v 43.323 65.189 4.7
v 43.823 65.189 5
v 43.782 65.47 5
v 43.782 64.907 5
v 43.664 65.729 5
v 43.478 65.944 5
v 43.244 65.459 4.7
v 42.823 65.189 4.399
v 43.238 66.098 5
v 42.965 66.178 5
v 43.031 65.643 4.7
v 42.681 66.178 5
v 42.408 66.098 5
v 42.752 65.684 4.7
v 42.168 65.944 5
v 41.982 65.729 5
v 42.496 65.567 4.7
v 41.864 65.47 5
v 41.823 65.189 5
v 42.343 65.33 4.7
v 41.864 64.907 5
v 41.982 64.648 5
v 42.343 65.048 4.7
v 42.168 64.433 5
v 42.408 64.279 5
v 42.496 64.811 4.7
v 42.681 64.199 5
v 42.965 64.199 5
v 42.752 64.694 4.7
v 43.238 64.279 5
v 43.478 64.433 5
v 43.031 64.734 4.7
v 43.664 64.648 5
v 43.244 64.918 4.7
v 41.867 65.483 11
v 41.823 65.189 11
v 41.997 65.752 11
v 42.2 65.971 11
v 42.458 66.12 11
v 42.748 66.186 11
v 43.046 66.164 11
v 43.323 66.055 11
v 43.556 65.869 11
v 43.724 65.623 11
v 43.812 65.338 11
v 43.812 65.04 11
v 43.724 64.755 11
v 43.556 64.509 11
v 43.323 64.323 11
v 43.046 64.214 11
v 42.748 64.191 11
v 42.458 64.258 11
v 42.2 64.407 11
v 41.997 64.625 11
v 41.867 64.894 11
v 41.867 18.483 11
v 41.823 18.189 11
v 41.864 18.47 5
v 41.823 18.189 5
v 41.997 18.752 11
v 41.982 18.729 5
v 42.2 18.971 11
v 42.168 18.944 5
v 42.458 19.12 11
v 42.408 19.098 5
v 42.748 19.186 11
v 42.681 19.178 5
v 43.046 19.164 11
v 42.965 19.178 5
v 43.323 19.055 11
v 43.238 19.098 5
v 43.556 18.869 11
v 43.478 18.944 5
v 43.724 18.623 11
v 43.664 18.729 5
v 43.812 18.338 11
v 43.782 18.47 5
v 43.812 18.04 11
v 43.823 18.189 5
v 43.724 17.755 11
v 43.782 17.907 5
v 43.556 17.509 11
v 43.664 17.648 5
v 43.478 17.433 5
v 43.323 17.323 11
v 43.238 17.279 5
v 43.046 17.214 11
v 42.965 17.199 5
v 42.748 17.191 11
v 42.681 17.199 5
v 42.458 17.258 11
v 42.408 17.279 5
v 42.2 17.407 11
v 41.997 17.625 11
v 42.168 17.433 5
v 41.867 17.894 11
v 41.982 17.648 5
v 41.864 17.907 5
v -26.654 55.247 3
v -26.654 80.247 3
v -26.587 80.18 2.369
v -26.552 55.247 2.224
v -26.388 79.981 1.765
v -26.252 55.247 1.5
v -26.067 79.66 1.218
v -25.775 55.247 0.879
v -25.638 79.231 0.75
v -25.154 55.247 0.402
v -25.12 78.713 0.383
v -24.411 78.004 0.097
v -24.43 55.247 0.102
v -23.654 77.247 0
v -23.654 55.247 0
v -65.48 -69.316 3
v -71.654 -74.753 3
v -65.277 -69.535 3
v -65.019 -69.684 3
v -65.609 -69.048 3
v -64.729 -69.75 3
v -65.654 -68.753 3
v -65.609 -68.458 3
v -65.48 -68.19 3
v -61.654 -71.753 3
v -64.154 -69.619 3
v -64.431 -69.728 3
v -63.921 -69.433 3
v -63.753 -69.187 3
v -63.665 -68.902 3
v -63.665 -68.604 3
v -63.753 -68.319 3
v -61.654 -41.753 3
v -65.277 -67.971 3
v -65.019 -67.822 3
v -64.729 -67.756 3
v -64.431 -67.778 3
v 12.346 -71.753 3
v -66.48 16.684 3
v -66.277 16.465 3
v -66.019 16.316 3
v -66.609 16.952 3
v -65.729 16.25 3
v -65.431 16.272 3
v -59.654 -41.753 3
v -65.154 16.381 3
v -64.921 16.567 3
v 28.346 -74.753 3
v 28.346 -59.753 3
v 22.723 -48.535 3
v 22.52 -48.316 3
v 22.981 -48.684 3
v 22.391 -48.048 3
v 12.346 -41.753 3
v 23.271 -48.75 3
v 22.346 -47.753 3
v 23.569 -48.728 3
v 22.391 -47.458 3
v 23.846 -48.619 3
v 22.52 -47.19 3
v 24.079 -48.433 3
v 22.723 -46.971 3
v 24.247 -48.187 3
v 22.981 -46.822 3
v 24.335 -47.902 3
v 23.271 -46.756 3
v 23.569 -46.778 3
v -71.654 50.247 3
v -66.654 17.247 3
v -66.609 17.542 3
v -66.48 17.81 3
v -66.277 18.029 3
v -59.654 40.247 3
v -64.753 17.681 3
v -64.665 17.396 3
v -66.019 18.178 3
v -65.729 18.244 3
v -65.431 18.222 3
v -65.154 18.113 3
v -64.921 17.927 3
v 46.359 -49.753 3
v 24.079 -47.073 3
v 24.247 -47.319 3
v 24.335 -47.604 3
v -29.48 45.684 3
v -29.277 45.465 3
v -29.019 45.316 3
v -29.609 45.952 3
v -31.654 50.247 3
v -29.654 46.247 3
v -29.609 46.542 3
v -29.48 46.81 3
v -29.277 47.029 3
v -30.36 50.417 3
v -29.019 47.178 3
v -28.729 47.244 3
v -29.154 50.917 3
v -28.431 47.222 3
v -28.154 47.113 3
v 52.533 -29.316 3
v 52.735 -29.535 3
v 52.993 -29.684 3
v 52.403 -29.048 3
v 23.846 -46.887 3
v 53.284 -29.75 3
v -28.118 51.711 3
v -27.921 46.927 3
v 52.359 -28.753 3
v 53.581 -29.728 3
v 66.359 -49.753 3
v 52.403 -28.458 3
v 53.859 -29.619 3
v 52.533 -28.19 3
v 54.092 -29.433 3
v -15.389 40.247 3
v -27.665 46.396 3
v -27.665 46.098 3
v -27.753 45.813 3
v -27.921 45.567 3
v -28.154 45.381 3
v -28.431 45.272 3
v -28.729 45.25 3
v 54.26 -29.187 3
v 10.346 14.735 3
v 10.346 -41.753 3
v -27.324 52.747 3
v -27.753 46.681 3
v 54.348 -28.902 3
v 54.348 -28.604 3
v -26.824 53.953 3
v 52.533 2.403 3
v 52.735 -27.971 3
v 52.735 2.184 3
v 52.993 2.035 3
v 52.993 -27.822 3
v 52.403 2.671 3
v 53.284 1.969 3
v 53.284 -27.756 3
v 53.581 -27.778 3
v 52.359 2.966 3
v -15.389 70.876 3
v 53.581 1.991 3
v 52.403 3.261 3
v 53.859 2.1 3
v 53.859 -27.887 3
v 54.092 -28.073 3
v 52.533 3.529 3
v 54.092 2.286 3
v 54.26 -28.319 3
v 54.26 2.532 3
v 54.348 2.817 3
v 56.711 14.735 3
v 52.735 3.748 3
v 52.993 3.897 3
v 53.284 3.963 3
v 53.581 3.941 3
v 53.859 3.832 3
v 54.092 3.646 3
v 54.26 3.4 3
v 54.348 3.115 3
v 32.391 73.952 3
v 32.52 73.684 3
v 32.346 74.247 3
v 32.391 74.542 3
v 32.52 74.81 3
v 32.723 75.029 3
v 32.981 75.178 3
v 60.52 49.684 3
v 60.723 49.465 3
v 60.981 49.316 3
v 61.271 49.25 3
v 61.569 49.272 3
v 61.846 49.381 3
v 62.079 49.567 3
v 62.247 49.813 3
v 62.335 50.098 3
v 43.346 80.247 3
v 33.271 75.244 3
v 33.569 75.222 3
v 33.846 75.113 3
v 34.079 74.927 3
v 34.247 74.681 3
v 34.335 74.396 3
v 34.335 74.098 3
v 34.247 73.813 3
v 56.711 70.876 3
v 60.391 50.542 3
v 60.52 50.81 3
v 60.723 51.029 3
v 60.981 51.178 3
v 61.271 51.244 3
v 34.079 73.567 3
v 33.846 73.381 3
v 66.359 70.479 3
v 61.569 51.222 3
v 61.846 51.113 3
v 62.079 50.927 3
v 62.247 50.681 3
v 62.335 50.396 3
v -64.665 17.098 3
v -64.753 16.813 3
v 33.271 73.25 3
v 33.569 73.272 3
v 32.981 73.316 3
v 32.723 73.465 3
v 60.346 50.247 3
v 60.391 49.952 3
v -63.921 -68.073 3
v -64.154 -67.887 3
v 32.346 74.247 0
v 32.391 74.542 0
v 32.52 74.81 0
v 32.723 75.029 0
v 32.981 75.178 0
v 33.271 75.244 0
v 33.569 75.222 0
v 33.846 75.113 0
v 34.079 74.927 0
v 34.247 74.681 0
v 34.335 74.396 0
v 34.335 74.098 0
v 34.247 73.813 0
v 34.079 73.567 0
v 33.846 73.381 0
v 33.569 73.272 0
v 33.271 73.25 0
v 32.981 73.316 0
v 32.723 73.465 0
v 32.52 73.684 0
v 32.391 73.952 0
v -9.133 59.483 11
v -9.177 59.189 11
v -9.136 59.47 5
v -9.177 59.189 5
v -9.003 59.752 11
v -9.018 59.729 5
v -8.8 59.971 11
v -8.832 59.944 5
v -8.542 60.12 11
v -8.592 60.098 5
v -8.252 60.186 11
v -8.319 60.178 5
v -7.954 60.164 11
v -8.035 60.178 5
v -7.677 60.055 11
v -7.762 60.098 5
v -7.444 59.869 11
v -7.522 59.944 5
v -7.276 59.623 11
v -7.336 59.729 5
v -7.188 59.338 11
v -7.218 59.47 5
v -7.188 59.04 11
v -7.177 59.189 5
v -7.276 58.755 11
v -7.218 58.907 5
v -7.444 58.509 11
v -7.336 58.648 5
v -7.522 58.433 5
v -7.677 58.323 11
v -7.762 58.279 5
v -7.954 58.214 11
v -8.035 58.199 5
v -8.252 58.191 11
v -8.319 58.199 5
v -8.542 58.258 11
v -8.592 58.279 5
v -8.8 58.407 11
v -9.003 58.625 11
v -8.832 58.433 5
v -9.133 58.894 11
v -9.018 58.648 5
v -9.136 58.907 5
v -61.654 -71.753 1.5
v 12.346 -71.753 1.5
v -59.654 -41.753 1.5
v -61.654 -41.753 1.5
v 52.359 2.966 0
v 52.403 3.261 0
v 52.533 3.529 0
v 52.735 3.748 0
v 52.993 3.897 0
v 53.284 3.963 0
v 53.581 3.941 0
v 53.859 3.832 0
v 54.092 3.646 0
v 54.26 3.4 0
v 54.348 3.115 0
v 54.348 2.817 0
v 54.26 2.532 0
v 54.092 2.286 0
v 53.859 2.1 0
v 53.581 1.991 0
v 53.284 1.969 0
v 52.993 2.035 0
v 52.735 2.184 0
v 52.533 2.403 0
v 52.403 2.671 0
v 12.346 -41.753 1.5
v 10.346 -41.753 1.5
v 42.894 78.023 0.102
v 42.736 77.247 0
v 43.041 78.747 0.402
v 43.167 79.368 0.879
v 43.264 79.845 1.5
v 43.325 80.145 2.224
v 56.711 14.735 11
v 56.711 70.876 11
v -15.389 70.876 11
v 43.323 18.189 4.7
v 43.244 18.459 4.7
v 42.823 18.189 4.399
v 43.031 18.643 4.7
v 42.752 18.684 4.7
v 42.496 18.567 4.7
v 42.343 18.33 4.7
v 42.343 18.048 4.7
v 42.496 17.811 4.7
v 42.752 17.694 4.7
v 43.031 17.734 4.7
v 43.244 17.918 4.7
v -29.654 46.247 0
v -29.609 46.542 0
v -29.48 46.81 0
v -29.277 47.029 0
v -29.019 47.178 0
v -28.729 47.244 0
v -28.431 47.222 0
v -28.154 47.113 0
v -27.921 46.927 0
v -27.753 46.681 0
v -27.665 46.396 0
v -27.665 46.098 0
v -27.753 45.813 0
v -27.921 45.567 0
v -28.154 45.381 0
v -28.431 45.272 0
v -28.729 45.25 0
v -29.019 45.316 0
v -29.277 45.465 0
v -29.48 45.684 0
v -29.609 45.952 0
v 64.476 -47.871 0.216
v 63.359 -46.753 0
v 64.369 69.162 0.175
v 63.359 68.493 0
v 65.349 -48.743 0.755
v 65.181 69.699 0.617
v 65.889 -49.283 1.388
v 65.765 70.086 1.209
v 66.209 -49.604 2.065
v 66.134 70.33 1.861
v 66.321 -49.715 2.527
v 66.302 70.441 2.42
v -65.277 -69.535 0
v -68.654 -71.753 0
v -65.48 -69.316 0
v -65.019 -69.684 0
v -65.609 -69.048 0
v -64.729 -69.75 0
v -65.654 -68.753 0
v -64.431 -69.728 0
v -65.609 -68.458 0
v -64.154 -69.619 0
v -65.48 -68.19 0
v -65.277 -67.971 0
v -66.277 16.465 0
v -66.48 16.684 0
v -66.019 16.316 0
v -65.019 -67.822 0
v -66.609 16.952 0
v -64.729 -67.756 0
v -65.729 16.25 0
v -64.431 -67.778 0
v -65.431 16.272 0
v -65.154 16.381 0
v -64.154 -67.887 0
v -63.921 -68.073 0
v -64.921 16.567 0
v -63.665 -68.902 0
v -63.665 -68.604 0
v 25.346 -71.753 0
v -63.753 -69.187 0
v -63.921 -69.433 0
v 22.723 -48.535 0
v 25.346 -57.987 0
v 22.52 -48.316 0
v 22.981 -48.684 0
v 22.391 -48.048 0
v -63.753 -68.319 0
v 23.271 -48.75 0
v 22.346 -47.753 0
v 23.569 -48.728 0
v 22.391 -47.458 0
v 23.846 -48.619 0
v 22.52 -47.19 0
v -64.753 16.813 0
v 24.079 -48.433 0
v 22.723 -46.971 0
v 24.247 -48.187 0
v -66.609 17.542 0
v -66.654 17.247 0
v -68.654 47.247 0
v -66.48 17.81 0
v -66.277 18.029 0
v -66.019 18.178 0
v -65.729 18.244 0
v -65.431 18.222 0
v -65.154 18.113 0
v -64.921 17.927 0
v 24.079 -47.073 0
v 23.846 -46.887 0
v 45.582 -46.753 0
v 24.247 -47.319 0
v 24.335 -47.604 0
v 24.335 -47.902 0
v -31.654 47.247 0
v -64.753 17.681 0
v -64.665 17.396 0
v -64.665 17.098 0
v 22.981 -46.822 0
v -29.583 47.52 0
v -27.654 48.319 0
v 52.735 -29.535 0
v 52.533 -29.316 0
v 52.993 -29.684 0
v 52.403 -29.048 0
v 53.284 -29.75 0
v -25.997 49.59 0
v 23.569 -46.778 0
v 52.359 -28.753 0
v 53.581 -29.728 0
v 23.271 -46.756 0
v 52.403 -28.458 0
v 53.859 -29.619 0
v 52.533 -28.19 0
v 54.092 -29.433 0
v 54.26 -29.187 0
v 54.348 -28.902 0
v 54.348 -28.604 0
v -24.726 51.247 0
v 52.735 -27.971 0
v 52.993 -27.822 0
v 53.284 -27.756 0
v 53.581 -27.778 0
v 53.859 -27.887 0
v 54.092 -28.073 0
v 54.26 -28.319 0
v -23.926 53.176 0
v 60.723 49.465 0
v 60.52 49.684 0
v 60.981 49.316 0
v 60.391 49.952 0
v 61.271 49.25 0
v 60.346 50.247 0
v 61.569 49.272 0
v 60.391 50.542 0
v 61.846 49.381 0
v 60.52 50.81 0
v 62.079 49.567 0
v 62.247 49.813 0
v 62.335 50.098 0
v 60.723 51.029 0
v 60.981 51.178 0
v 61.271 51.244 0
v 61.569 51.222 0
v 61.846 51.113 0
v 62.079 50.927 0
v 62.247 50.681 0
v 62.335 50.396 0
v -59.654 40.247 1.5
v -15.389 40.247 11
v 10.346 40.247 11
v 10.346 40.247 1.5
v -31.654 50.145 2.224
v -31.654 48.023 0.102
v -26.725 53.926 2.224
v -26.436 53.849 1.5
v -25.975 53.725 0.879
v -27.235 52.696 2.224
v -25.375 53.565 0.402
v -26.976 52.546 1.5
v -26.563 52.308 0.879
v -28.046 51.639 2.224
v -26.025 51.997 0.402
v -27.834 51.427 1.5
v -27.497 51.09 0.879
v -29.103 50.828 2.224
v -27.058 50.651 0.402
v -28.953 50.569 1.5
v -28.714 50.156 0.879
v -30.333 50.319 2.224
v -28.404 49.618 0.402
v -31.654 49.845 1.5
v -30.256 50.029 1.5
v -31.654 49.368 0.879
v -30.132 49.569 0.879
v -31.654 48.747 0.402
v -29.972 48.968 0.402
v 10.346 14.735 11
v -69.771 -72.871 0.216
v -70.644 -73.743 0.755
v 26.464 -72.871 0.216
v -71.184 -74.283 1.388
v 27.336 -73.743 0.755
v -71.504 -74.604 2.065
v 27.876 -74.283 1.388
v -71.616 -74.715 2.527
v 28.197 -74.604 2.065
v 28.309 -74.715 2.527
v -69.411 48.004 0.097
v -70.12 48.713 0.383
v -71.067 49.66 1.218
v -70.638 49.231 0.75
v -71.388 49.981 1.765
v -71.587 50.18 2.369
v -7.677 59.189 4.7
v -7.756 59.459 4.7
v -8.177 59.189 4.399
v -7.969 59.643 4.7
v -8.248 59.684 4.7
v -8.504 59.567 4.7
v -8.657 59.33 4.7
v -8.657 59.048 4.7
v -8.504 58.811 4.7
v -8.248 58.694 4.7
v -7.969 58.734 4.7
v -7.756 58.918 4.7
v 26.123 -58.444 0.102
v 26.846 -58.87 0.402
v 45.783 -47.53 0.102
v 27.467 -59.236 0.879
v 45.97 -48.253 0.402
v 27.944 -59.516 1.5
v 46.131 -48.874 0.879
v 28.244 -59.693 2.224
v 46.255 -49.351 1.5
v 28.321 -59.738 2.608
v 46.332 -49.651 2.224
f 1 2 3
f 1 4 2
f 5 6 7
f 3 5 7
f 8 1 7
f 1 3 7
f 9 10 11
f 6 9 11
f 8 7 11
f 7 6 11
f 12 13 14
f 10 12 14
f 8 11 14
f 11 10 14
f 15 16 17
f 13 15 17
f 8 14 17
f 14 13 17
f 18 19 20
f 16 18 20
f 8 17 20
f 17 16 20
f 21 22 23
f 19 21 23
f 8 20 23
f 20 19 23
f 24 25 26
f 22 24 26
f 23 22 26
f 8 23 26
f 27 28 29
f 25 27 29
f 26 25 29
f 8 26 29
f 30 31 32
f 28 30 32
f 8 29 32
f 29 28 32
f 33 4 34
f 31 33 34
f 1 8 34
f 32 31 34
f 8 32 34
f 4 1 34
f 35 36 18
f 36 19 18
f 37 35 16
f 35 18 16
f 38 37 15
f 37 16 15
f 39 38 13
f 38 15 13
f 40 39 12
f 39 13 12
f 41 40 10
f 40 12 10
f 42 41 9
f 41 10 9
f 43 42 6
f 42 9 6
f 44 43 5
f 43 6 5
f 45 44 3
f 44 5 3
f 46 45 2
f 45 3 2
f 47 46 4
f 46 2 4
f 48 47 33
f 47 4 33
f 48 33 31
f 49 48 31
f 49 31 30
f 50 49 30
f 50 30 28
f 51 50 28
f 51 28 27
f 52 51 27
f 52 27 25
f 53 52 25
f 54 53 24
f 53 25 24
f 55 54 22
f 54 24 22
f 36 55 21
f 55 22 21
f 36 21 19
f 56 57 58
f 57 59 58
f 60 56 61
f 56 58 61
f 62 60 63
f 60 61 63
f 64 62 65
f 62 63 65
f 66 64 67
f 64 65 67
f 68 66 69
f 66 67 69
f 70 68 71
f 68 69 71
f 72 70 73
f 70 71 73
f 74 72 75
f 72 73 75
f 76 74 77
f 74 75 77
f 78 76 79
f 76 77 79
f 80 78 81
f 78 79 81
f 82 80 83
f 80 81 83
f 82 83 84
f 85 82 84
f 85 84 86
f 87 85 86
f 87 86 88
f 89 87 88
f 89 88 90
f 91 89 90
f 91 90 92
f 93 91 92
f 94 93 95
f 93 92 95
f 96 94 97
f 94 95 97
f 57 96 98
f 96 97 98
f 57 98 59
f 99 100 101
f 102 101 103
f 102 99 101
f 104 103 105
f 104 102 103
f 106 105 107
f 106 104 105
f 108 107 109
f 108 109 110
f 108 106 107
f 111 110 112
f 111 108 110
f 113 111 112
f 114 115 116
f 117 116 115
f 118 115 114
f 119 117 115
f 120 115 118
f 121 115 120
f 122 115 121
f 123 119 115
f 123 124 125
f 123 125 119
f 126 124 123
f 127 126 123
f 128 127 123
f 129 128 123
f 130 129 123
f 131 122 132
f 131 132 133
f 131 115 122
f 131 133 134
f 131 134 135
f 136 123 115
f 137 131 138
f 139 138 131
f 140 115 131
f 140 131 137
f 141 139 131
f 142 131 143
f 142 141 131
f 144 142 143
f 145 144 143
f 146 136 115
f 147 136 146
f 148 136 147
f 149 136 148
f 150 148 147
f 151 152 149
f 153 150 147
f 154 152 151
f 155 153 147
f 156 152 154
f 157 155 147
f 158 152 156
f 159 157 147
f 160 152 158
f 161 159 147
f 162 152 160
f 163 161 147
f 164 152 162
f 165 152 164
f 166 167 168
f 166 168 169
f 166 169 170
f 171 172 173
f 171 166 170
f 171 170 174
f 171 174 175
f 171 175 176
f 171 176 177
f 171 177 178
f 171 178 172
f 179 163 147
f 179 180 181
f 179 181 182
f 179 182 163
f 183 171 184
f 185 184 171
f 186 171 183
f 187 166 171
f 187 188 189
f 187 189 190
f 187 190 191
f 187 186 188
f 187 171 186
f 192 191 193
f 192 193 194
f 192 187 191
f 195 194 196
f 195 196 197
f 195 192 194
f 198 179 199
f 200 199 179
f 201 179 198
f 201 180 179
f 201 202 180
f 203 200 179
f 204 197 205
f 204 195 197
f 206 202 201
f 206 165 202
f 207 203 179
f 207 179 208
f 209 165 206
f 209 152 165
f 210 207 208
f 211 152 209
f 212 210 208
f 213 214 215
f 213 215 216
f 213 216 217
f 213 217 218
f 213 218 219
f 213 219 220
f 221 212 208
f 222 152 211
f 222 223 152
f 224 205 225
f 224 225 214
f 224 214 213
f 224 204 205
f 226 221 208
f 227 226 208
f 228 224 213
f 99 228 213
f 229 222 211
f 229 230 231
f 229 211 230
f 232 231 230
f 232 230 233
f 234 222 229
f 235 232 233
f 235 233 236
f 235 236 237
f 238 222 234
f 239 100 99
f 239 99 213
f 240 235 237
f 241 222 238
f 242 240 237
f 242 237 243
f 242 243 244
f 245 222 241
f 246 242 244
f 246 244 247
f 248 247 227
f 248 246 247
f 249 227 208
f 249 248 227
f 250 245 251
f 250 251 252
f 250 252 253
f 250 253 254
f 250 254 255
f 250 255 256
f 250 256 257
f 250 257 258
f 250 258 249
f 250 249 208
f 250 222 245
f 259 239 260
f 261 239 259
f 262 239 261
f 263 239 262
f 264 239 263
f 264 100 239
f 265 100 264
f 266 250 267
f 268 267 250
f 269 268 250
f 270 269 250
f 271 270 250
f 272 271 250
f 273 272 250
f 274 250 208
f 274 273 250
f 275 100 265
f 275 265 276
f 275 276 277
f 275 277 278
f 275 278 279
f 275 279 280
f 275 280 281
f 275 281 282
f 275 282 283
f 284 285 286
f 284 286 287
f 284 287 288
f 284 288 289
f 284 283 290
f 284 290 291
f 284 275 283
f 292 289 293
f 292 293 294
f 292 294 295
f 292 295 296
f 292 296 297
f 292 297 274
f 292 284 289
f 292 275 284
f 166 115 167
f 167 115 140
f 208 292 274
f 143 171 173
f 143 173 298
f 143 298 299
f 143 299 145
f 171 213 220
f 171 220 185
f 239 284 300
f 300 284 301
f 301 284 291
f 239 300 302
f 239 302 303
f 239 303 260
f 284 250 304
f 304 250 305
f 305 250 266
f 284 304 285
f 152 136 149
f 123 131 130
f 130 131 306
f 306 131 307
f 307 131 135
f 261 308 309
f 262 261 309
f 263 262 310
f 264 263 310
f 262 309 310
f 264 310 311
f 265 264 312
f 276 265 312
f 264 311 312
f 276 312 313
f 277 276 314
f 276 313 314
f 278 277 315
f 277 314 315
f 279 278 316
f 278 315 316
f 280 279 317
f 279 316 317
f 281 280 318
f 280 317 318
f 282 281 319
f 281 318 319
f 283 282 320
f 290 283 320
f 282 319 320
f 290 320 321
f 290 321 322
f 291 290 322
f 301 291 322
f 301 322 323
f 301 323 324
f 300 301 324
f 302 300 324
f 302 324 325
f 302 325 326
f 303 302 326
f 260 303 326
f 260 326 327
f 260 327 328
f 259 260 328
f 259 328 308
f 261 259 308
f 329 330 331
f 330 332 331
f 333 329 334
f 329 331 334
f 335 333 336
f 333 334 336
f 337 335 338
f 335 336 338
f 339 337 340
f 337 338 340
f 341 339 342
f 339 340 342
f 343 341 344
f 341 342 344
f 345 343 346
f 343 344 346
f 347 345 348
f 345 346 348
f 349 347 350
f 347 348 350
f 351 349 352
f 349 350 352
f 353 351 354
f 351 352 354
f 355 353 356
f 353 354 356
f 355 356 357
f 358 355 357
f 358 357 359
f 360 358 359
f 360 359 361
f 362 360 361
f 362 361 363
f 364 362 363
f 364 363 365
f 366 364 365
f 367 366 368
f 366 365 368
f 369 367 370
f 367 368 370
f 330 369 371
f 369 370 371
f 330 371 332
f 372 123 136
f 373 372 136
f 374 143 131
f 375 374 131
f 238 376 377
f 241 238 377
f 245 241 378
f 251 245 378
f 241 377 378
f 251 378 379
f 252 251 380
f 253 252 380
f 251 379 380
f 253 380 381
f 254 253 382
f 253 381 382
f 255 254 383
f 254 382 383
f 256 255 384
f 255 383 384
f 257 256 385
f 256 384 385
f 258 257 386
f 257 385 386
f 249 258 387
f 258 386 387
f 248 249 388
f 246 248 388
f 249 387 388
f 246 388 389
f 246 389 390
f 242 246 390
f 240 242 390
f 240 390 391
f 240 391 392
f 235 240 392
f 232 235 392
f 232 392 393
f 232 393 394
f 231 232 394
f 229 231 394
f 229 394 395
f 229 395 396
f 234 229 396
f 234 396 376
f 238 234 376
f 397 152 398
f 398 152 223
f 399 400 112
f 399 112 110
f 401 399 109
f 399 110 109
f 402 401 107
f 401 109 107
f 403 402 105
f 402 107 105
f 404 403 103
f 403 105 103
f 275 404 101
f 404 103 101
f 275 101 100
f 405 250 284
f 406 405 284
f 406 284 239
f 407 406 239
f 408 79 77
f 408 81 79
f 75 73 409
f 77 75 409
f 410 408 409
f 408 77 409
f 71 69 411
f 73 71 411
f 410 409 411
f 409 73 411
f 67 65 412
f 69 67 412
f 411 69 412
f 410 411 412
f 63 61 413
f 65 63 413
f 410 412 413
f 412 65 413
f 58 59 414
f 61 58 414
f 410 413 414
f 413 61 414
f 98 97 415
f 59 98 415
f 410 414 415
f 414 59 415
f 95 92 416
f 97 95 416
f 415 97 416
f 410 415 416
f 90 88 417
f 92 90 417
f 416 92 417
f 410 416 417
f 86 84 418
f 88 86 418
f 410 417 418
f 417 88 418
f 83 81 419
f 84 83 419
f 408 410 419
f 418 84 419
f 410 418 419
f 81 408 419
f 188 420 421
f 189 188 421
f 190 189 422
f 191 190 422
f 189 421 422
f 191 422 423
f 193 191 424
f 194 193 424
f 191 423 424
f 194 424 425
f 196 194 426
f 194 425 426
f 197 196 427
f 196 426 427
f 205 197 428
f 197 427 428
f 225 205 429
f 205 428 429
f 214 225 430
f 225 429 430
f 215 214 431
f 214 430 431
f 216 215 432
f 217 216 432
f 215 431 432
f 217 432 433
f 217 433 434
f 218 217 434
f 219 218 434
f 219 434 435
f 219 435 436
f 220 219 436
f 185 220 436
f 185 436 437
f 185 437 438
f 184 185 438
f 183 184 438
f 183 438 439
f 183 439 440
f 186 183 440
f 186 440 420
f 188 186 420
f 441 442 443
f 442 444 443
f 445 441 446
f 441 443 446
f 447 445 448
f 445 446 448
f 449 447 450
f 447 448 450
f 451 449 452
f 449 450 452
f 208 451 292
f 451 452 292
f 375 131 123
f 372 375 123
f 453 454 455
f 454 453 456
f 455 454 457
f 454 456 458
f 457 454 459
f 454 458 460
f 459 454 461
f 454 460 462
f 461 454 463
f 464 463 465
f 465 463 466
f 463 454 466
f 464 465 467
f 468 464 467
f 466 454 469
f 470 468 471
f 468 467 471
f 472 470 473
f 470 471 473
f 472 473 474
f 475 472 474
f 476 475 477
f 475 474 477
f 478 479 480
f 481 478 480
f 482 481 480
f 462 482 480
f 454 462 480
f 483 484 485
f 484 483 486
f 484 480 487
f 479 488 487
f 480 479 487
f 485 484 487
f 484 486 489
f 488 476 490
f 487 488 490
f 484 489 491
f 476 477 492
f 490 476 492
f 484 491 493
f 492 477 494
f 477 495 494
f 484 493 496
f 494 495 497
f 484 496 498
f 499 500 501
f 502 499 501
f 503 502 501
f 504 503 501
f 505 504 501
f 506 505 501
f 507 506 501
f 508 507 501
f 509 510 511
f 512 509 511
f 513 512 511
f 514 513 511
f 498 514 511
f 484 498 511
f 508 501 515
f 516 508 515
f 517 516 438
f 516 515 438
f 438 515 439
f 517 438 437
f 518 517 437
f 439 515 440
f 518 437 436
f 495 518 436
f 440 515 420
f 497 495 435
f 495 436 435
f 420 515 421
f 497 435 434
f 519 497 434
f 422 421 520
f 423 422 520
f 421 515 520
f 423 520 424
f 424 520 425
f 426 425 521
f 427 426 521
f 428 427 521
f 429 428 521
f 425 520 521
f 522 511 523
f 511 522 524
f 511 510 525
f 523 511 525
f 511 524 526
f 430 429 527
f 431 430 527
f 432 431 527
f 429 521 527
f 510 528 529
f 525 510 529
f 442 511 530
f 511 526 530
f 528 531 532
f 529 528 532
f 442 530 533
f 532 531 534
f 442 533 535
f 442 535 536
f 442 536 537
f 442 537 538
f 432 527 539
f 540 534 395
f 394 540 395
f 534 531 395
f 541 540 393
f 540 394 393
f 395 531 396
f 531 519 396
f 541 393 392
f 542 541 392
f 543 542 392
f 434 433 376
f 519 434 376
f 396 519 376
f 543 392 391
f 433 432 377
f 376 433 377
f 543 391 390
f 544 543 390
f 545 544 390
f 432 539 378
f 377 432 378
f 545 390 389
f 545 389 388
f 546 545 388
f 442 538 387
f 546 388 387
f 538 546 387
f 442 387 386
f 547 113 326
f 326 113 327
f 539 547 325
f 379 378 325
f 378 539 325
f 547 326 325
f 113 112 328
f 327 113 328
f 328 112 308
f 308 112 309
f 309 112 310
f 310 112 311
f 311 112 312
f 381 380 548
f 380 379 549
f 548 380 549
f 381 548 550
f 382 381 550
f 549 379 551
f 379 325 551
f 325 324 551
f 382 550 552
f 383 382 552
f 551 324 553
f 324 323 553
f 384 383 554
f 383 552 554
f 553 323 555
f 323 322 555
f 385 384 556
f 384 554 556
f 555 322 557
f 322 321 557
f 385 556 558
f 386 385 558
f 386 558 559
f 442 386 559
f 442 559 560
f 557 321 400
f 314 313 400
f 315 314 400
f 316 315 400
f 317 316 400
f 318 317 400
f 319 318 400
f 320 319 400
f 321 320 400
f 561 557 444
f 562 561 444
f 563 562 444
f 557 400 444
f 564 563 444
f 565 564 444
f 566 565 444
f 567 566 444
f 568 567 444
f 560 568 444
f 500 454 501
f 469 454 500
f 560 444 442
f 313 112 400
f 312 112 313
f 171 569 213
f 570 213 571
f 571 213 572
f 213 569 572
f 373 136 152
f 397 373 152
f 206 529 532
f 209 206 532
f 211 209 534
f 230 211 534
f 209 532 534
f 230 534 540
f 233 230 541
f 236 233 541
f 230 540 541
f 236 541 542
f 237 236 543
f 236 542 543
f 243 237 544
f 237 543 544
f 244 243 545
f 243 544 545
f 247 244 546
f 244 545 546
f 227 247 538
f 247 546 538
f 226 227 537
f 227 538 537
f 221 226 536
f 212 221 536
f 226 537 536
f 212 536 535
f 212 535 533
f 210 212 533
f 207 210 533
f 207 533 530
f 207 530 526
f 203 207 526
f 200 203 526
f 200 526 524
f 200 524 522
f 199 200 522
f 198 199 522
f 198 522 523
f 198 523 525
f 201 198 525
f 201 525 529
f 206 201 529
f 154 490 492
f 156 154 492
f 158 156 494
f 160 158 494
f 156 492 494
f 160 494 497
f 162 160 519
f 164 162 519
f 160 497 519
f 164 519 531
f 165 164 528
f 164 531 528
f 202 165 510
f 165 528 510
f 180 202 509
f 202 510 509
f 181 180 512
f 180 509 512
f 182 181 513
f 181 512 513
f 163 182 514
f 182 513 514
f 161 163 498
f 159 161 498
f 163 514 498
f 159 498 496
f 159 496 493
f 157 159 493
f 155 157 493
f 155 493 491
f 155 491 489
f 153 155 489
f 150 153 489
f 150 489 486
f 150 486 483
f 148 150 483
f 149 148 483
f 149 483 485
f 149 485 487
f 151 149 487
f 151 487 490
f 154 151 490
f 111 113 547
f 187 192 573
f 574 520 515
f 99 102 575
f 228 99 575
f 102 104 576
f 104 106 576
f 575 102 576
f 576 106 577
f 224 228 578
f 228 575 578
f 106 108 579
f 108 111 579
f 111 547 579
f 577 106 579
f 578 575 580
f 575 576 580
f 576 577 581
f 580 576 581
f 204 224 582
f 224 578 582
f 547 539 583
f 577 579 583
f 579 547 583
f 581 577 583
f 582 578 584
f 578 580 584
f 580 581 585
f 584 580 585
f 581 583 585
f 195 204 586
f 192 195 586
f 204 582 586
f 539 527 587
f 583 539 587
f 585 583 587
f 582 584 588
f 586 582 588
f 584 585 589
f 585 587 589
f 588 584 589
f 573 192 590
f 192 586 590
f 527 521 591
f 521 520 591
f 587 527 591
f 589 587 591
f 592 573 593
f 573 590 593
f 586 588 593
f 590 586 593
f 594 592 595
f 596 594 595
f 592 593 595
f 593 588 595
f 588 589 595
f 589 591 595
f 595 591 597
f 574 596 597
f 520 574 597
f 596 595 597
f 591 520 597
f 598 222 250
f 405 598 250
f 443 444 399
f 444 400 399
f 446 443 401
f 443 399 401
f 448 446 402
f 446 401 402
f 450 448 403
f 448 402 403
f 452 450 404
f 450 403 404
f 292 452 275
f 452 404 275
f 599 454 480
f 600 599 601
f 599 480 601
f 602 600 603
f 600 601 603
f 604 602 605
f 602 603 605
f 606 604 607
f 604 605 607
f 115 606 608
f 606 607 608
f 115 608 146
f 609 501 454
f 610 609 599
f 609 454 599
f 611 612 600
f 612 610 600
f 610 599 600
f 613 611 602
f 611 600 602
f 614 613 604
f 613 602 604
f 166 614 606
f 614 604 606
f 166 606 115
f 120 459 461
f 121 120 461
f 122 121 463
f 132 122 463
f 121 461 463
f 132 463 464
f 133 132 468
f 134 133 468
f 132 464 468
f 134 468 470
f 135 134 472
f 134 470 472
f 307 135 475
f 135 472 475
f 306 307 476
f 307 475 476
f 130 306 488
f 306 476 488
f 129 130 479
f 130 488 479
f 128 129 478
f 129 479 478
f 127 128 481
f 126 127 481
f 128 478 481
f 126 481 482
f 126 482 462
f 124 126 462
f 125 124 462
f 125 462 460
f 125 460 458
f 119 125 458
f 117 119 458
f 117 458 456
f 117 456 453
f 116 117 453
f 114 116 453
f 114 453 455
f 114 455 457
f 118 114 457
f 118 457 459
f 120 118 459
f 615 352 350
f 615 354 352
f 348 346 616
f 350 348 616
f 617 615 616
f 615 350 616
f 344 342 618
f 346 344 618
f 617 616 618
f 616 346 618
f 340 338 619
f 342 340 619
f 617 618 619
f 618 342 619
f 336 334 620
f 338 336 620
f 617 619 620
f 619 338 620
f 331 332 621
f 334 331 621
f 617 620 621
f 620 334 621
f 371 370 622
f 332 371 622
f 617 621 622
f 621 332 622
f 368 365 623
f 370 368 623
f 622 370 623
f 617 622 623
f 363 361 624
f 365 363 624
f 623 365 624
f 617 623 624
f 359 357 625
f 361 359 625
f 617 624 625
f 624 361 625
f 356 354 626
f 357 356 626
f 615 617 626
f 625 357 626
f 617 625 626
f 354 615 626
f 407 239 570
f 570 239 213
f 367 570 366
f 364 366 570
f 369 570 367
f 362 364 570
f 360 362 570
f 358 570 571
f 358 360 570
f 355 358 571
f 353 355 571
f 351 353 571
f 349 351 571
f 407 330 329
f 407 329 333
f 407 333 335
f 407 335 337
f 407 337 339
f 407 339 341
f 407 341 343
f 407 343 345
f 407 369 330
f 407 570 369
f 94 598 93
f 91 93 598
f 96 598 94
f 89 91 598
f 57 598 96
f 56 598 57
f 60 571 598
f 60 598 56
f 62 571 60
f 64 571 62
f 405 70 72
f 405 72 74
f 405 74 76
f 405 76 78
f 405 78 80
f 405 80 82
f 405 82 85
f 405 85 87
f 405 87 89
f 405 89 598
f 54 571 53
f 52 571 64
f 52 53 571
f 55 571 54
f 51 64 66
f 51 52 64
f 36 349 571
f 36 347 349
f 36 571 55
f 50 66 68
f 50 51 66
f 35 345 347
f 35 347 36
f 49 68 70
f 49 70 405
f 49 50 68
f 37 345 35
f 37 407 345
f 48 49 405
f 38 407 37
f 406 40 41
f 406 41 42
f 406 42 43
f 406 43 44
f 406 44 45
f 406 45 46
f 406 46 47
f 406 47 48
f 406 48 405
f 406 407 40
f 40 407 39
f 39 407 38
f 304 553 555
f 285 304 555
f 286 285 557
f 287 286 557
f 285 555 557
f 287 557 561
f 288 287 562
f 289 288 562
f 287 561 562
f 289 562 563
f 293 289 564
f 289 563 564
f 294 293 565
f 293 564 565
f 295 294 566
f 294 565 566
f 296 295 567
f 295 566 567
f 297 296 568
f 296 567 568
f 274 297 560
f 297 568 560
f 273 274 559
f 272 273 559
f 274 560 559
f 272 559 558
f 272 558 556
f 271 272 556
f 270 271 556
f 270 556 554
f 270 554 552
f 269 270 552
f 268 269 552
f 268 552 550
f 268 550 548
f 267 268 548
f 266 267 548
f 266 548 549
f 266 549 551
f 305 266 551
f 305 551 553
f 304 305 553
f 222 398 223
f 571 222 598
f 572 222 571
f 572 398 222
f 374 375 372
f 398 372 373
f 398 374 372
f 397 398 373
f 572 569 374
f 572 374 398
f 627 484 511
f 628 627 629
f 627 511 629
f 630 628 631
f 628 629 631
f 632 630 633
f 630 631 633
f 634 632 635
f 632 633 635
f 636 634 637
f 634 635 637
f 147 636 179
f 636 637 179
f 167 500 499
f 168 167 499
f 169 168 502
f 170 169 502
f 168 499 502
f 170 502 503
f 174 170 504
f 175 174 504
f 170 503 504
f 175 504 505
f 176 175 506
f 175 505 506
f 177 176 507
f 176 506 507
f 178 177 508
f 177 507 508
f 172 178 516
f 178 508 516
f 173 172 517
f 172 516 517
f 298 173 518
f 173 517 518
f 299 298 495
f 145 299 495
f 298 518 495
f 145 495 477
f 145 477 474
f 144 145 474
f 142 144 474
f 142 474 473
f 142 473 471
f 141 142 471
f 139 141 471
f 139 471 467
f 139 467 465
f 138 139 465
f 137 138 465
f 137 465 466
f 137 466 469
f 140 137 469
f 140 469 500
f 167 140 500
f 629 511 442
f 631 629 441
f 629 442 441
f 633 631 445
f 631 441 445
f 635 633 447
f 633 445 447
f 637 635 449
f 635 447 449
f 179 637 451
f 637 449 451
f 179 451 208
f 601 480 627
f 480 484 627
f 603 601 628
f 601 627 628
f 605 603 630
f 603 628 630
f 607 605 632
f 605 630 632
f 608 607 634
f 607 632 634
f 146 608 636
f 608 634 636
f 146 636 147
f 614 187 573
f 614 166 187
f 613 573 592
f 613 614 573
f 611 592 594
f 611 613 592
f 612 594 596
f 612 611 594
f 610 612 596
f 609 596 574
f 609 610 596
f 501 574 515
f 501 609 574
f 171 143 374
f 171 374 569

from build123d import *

# Parameters (mm, degrees)
F0_W      = 45
F0_H      = 110
F0_H_2    = 15
F0_W_2    = 20
F0_H_3    = 100
F0_W_3    = 55
F1_DEPTH  = 3
F2_R      = 5
F3_R      = 2.99999
F5_D      = 2
F6_W      = 70
F6_H      = 82
F7_DEPTH  = 1.5
F8_W      = 46.3650951658
F8_H      = 25.5117665604
F9_DEPTH  = 8
F11_D     = 2
F11_DEPTH = 6
F11_TIP   = 0.600860619


# Not quite as in the source:
# - a fillet or chamfer is up to 0.001 mm smaller than in the source, because OpenCascade refuses the exact size


with BuildPart() as f1:
    # F0 (on Top) → F1 (new body)
    with BuildSketch(Plane.XY):
        with Locations((-49.1538274859, -4.7530609369)):
            Rectangle(F0_W, F0_H)
        Polygon((43.3461725141, 50.2469390631), (-26.6538274859, 50.2469390631), (-26.6538274859, -59.7530609369), (28.3461725141, -59.7530609369), (46.3587938504, -49.7530609369), (46.3587938504, 50.2469390631), align=None)
        with Locations((-49.1538274859, -67.2530609369)):
            Rectangle(F0_W, F0_H_2)
        with Locations((56.3587938504, 0.2469390631)):
            Rectangle(F0_W_2, F0_H_3)
        with Locations((0.8461725141, -67.2530609369)):
            Rectangle(F0_W_3, F0_H_2)
        Polygon((-26.6538274859, 80.2469390631), (-26.6538274859, 50.2469390631), (43.3461725141, 50.2469390631), (43.3461725141, 70.4786608508), (43.3461725141, 80.2469390631), align=None)
        Polygon((43.3461725141, 70.4786608508), (43.3461725141, 50.2469390631), (46.3587938504, 50.2469390631), (66.3587938504, 50.2469390631), (66.3587938504, 70.4786608508), align=None)
        Polygon((43.3461725141, 80.2469390631), (43.3461725141, 70.4786608508), (66.3587938504, 70.4786608508), align=None)
    extrude(amount=F1_DEPTH)

    # F2
    f2_edges = [f1.edges().sort_by_distance(p)[0] for p in [
        (-26.653827, 50.246939, 1.5),
    ]]
    fillet(f2_edges, radius=F2_R)

    # F3 (radius 3 in the source; OpenCascade refuses exactly that, so slightly less here)
    f3_edges = [f1.edges().sort_by_distance(p)[0] for p in [
        (-26.653827, 67.746939, 0),
        (-28.118294, 51.711405, 0),
        (8.346173, 80.246939, 0),
        (-51.653827, 50.246939, 0),
        (54.852483, 75.3628, 0),
        (-71.653827, -12.253061, 0),
        (66.358794, 10.3628, 0),
        (-21.653827, -74.753061, 0),
        (56.358794, -49.753061, 0),
        (28.346173, -67.253061, 0),
        (37.352483, -54.753061, 0),
    ]]
    fillet(f3_edges, radius=F3_R)

    # F5 (through all)
    with Locations(Plane.XY.offset(3)):
        with Locations((-65.6538274859, 17.2469390631), (-64.6538274859, -68.7530609369), (23.3461725141, -47.7530609369), (53.3587938504, -28.7530609369), (53.3587938504, 2.9659790631), (61.3461725141, 50.2469390631), (33.3461725141, 74.2469390631), (-28.6538274859, 46.2469390631)):
            Hole(F5_D / 2)

    # F6 (on face) → F7 (cut)
    with BuildSketch(Plane.XY.offset(3)):
        with Locations((-24.6538274859, -0.7530609369)):
            Rectangle(F6_W, F6_H)
        Polygon((-61.6538274859, -41.7530609369), (-61.6538274859, -71.7530609369), (12.3461725141, -71.7530609369), (12.3461725141, -41.7530609369), (10.3461725141, -41.7530609369), (-59.6538274859, -41.7530609369), align=None)
    extrude(amount=-F7_DEPTH, mode=Mode.SUBTRACT)

    # F8 (on face) → F9 (join)
    with BuildSketch(Plane.XY.offset(3)):
        Polygon((-15.3889879584, 70.8764791489), (-15.3889879584, 40.2469390631), (10.3461725141, 40.2469390631), (56.7112676799, 40.2469390631), (56.7112676799, 70.8764791489), align=None)
        with Locations((33.528720097, 27.4910557829)):
            Rectangle(F8_W, F8_H)
    extrude(amount=F9_DEPTH)

    # F11
    with Locations(Plane.XY.offset(11)):
        with Locations((-8.1770029031, 59.1886730194), (42.8229970969, 65.1886730194), (42.8229970969, 18.1886730194)):
            Hole(F11_D / 2, depth=F11_DEPTH)
            with Locations((0, 0, -(F11_DEPTH + F11_TIP / 2))):  # 118° drill point
                Cone(0, F11_D / 2, F11_TIP, mode=Mode.SUBTRACT)


solid = f1.part
